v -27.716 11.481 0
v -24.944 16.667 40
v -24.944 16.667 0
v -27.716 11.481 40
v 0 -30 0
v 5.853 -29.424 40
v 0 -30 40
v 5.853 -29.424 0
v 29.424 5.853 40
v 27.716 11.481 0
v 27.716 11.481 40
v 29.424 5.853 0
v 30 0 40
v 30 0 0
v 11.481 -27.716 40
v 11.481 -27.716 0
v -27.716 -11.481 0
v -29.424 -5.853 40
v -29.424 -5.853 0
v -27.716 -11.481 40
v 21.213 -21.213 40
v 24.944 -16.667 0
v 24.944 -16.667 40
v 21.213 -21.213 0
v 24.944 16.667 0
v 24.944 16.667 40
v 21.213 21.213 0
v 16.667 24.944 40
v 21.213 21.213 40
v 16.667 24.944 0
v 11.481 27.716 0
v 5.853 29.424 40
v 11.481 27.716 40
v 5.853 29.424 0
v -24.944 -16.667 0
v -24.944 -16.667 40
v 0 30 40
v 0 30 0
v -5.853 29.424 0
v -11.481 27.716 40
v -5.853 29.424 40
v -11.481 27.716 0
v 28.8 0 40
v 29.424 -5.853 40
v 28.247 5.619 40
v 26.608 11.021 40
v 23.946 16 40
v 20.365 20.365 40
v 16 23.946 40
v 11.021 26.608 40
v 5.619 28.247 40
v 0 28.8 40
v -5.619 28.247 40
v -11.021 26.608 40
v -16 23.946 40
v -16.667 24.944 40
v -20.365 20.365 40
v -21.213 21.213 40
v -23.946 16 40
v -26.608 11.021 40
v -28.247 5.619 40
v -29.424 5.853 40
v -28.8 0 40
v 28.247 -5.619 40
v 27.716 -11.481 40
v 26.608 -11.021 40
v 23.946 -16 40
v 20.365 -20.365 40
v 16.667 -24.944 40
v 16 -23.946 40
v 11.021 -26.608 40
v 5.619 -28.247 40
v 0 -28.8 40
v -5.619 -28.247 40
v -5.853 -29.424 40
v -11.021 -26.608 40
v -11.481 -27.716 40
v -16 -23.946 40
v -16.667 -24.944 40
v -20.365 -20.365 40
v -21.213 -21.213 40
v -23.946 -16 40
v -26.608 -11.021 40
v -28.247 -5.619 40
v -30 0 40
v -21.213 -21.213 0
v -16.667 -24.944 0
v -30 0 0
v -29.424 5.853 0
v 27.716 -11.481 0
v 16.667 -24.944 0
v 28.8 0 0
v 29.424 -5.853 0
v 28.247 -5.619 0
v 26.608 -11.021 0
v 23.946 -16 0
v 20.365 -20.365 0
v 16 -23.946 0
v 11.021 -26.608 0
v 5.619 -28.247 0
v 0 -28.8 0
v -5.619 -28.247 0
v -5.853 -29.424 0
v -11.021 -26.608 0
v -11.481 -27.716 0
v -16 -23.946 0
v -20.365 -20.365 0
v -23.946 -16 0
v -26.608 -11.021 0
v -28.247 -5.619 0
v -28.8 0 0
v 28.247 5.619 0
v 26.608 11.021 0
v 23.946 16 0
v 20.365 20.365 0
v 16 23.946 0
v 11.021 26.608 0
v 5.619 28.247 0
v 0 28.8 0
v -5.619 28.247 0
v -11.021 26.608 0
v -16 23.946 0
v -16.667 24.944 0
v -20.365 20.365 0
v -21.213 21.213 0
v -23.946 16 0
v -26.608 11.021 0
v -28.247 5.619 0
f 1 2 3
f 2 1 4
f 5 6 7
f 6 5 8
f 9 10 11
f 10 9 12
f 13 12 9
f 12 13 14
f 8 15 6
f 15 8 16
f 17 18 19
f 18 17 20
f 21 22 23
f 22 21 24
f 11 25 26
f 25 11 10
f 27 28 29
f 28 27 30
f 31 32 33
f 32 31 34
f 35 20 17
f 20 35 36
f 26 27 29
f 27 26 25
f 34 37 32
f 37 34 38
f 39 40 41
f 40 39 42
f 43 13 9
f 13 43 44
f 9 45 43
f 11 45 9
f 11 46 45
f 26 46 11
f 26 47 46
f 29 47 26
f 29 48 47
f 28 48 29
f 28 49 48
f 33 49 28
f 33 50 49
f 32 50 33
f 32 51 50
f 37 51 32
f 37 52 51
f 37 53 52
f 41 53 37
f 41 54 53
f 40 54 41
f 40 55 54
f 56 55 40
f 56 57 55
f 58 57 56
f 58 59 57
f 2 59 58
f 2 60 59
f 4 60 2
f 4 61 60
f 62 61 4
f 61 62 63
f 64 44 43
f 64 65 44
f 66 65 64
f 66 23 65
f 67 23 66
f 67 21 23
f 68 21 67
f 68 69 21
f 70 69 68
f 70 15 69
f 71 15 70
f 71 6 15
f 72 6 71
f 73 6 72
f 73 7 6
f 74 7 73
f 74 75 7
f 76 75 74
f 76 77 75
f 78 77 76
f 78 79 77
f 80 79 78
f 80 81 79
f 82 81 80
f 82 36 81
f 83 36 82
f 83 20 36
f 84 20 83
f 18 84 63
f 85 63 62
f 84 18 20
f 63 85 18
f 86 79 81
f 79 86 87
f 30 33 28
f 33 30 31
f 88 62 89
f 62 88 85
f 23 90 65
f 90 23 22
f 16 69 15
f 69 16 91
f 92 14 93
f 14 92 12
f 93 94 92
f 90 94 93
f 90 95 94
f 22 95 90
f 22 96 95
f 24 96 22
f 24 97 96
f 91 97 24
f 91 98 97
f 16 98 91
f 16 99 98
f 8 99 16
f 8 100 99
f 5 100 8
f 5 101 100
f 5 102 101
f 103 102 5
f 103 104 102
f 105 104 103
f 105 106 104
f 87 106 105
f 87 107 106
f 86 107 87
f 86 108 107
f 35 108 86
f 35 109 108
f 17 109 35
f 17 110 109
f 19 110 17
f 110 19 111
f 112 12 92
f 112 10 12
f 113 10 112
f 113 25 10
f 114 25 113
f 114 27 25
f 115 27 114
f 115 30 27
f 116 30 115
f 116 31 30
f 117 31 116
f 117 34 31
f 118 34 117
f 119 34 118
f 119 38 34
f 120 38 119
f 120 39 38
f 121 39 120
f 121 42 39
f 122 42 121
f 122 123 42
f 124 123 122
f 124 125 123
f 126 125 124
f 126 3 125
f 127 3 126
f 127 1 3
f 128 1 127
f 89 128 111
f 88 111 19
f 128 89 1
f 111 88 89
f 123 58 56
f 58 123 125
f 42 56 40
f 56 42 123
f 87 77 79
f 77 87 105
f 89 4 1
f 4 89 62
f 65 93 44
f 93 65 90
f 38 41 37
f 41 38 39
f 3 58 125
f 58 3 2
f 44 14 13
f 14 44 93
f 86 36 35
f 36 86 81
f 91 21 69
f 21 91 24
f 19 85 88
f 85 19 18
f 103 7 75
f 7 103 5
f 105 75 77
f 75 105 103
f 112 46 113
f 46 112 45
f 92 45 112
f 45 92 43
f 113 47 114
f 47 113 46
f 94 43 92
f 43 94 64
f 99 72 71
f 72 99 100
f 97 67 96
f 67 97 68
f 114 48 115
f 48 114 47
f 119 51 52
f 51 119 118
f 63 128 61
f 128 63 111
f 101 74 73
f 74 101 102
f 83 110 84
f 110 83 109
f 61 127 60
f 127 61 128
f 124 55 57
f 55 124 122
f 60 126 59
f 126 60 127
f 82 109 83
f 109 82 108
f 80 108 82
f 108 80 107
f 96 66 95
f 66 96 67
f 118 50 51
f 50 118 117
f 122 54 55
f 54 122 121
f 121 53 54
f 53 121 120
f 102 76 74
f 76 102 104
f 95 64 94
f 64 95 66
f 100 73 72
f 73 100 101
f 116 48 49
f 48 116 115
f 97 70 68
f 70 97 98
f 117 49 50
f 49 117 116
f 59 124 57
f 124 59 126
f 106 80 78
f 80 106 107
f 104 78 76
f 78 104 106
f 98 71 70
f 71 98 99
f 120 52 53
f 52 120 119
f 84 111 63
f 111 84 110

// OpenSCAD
$fn = 32;

// ----------------------------------------------------------------------
// Thin tube: 1.2 mm wall
// ----------------------------------------------------------------------

// --- parameters (mm) ---
tube_od = 60;             // outer diameter
tube_h = 40;              // height, Z
wall = 1.2;               // wall thickness

difference() {
  cylinder(h = tube_h, d = tube_od);
  translate([0, 0, -1]) cylinder(h = tube_h + 2, d = tube_od - 2 * wall);
}
